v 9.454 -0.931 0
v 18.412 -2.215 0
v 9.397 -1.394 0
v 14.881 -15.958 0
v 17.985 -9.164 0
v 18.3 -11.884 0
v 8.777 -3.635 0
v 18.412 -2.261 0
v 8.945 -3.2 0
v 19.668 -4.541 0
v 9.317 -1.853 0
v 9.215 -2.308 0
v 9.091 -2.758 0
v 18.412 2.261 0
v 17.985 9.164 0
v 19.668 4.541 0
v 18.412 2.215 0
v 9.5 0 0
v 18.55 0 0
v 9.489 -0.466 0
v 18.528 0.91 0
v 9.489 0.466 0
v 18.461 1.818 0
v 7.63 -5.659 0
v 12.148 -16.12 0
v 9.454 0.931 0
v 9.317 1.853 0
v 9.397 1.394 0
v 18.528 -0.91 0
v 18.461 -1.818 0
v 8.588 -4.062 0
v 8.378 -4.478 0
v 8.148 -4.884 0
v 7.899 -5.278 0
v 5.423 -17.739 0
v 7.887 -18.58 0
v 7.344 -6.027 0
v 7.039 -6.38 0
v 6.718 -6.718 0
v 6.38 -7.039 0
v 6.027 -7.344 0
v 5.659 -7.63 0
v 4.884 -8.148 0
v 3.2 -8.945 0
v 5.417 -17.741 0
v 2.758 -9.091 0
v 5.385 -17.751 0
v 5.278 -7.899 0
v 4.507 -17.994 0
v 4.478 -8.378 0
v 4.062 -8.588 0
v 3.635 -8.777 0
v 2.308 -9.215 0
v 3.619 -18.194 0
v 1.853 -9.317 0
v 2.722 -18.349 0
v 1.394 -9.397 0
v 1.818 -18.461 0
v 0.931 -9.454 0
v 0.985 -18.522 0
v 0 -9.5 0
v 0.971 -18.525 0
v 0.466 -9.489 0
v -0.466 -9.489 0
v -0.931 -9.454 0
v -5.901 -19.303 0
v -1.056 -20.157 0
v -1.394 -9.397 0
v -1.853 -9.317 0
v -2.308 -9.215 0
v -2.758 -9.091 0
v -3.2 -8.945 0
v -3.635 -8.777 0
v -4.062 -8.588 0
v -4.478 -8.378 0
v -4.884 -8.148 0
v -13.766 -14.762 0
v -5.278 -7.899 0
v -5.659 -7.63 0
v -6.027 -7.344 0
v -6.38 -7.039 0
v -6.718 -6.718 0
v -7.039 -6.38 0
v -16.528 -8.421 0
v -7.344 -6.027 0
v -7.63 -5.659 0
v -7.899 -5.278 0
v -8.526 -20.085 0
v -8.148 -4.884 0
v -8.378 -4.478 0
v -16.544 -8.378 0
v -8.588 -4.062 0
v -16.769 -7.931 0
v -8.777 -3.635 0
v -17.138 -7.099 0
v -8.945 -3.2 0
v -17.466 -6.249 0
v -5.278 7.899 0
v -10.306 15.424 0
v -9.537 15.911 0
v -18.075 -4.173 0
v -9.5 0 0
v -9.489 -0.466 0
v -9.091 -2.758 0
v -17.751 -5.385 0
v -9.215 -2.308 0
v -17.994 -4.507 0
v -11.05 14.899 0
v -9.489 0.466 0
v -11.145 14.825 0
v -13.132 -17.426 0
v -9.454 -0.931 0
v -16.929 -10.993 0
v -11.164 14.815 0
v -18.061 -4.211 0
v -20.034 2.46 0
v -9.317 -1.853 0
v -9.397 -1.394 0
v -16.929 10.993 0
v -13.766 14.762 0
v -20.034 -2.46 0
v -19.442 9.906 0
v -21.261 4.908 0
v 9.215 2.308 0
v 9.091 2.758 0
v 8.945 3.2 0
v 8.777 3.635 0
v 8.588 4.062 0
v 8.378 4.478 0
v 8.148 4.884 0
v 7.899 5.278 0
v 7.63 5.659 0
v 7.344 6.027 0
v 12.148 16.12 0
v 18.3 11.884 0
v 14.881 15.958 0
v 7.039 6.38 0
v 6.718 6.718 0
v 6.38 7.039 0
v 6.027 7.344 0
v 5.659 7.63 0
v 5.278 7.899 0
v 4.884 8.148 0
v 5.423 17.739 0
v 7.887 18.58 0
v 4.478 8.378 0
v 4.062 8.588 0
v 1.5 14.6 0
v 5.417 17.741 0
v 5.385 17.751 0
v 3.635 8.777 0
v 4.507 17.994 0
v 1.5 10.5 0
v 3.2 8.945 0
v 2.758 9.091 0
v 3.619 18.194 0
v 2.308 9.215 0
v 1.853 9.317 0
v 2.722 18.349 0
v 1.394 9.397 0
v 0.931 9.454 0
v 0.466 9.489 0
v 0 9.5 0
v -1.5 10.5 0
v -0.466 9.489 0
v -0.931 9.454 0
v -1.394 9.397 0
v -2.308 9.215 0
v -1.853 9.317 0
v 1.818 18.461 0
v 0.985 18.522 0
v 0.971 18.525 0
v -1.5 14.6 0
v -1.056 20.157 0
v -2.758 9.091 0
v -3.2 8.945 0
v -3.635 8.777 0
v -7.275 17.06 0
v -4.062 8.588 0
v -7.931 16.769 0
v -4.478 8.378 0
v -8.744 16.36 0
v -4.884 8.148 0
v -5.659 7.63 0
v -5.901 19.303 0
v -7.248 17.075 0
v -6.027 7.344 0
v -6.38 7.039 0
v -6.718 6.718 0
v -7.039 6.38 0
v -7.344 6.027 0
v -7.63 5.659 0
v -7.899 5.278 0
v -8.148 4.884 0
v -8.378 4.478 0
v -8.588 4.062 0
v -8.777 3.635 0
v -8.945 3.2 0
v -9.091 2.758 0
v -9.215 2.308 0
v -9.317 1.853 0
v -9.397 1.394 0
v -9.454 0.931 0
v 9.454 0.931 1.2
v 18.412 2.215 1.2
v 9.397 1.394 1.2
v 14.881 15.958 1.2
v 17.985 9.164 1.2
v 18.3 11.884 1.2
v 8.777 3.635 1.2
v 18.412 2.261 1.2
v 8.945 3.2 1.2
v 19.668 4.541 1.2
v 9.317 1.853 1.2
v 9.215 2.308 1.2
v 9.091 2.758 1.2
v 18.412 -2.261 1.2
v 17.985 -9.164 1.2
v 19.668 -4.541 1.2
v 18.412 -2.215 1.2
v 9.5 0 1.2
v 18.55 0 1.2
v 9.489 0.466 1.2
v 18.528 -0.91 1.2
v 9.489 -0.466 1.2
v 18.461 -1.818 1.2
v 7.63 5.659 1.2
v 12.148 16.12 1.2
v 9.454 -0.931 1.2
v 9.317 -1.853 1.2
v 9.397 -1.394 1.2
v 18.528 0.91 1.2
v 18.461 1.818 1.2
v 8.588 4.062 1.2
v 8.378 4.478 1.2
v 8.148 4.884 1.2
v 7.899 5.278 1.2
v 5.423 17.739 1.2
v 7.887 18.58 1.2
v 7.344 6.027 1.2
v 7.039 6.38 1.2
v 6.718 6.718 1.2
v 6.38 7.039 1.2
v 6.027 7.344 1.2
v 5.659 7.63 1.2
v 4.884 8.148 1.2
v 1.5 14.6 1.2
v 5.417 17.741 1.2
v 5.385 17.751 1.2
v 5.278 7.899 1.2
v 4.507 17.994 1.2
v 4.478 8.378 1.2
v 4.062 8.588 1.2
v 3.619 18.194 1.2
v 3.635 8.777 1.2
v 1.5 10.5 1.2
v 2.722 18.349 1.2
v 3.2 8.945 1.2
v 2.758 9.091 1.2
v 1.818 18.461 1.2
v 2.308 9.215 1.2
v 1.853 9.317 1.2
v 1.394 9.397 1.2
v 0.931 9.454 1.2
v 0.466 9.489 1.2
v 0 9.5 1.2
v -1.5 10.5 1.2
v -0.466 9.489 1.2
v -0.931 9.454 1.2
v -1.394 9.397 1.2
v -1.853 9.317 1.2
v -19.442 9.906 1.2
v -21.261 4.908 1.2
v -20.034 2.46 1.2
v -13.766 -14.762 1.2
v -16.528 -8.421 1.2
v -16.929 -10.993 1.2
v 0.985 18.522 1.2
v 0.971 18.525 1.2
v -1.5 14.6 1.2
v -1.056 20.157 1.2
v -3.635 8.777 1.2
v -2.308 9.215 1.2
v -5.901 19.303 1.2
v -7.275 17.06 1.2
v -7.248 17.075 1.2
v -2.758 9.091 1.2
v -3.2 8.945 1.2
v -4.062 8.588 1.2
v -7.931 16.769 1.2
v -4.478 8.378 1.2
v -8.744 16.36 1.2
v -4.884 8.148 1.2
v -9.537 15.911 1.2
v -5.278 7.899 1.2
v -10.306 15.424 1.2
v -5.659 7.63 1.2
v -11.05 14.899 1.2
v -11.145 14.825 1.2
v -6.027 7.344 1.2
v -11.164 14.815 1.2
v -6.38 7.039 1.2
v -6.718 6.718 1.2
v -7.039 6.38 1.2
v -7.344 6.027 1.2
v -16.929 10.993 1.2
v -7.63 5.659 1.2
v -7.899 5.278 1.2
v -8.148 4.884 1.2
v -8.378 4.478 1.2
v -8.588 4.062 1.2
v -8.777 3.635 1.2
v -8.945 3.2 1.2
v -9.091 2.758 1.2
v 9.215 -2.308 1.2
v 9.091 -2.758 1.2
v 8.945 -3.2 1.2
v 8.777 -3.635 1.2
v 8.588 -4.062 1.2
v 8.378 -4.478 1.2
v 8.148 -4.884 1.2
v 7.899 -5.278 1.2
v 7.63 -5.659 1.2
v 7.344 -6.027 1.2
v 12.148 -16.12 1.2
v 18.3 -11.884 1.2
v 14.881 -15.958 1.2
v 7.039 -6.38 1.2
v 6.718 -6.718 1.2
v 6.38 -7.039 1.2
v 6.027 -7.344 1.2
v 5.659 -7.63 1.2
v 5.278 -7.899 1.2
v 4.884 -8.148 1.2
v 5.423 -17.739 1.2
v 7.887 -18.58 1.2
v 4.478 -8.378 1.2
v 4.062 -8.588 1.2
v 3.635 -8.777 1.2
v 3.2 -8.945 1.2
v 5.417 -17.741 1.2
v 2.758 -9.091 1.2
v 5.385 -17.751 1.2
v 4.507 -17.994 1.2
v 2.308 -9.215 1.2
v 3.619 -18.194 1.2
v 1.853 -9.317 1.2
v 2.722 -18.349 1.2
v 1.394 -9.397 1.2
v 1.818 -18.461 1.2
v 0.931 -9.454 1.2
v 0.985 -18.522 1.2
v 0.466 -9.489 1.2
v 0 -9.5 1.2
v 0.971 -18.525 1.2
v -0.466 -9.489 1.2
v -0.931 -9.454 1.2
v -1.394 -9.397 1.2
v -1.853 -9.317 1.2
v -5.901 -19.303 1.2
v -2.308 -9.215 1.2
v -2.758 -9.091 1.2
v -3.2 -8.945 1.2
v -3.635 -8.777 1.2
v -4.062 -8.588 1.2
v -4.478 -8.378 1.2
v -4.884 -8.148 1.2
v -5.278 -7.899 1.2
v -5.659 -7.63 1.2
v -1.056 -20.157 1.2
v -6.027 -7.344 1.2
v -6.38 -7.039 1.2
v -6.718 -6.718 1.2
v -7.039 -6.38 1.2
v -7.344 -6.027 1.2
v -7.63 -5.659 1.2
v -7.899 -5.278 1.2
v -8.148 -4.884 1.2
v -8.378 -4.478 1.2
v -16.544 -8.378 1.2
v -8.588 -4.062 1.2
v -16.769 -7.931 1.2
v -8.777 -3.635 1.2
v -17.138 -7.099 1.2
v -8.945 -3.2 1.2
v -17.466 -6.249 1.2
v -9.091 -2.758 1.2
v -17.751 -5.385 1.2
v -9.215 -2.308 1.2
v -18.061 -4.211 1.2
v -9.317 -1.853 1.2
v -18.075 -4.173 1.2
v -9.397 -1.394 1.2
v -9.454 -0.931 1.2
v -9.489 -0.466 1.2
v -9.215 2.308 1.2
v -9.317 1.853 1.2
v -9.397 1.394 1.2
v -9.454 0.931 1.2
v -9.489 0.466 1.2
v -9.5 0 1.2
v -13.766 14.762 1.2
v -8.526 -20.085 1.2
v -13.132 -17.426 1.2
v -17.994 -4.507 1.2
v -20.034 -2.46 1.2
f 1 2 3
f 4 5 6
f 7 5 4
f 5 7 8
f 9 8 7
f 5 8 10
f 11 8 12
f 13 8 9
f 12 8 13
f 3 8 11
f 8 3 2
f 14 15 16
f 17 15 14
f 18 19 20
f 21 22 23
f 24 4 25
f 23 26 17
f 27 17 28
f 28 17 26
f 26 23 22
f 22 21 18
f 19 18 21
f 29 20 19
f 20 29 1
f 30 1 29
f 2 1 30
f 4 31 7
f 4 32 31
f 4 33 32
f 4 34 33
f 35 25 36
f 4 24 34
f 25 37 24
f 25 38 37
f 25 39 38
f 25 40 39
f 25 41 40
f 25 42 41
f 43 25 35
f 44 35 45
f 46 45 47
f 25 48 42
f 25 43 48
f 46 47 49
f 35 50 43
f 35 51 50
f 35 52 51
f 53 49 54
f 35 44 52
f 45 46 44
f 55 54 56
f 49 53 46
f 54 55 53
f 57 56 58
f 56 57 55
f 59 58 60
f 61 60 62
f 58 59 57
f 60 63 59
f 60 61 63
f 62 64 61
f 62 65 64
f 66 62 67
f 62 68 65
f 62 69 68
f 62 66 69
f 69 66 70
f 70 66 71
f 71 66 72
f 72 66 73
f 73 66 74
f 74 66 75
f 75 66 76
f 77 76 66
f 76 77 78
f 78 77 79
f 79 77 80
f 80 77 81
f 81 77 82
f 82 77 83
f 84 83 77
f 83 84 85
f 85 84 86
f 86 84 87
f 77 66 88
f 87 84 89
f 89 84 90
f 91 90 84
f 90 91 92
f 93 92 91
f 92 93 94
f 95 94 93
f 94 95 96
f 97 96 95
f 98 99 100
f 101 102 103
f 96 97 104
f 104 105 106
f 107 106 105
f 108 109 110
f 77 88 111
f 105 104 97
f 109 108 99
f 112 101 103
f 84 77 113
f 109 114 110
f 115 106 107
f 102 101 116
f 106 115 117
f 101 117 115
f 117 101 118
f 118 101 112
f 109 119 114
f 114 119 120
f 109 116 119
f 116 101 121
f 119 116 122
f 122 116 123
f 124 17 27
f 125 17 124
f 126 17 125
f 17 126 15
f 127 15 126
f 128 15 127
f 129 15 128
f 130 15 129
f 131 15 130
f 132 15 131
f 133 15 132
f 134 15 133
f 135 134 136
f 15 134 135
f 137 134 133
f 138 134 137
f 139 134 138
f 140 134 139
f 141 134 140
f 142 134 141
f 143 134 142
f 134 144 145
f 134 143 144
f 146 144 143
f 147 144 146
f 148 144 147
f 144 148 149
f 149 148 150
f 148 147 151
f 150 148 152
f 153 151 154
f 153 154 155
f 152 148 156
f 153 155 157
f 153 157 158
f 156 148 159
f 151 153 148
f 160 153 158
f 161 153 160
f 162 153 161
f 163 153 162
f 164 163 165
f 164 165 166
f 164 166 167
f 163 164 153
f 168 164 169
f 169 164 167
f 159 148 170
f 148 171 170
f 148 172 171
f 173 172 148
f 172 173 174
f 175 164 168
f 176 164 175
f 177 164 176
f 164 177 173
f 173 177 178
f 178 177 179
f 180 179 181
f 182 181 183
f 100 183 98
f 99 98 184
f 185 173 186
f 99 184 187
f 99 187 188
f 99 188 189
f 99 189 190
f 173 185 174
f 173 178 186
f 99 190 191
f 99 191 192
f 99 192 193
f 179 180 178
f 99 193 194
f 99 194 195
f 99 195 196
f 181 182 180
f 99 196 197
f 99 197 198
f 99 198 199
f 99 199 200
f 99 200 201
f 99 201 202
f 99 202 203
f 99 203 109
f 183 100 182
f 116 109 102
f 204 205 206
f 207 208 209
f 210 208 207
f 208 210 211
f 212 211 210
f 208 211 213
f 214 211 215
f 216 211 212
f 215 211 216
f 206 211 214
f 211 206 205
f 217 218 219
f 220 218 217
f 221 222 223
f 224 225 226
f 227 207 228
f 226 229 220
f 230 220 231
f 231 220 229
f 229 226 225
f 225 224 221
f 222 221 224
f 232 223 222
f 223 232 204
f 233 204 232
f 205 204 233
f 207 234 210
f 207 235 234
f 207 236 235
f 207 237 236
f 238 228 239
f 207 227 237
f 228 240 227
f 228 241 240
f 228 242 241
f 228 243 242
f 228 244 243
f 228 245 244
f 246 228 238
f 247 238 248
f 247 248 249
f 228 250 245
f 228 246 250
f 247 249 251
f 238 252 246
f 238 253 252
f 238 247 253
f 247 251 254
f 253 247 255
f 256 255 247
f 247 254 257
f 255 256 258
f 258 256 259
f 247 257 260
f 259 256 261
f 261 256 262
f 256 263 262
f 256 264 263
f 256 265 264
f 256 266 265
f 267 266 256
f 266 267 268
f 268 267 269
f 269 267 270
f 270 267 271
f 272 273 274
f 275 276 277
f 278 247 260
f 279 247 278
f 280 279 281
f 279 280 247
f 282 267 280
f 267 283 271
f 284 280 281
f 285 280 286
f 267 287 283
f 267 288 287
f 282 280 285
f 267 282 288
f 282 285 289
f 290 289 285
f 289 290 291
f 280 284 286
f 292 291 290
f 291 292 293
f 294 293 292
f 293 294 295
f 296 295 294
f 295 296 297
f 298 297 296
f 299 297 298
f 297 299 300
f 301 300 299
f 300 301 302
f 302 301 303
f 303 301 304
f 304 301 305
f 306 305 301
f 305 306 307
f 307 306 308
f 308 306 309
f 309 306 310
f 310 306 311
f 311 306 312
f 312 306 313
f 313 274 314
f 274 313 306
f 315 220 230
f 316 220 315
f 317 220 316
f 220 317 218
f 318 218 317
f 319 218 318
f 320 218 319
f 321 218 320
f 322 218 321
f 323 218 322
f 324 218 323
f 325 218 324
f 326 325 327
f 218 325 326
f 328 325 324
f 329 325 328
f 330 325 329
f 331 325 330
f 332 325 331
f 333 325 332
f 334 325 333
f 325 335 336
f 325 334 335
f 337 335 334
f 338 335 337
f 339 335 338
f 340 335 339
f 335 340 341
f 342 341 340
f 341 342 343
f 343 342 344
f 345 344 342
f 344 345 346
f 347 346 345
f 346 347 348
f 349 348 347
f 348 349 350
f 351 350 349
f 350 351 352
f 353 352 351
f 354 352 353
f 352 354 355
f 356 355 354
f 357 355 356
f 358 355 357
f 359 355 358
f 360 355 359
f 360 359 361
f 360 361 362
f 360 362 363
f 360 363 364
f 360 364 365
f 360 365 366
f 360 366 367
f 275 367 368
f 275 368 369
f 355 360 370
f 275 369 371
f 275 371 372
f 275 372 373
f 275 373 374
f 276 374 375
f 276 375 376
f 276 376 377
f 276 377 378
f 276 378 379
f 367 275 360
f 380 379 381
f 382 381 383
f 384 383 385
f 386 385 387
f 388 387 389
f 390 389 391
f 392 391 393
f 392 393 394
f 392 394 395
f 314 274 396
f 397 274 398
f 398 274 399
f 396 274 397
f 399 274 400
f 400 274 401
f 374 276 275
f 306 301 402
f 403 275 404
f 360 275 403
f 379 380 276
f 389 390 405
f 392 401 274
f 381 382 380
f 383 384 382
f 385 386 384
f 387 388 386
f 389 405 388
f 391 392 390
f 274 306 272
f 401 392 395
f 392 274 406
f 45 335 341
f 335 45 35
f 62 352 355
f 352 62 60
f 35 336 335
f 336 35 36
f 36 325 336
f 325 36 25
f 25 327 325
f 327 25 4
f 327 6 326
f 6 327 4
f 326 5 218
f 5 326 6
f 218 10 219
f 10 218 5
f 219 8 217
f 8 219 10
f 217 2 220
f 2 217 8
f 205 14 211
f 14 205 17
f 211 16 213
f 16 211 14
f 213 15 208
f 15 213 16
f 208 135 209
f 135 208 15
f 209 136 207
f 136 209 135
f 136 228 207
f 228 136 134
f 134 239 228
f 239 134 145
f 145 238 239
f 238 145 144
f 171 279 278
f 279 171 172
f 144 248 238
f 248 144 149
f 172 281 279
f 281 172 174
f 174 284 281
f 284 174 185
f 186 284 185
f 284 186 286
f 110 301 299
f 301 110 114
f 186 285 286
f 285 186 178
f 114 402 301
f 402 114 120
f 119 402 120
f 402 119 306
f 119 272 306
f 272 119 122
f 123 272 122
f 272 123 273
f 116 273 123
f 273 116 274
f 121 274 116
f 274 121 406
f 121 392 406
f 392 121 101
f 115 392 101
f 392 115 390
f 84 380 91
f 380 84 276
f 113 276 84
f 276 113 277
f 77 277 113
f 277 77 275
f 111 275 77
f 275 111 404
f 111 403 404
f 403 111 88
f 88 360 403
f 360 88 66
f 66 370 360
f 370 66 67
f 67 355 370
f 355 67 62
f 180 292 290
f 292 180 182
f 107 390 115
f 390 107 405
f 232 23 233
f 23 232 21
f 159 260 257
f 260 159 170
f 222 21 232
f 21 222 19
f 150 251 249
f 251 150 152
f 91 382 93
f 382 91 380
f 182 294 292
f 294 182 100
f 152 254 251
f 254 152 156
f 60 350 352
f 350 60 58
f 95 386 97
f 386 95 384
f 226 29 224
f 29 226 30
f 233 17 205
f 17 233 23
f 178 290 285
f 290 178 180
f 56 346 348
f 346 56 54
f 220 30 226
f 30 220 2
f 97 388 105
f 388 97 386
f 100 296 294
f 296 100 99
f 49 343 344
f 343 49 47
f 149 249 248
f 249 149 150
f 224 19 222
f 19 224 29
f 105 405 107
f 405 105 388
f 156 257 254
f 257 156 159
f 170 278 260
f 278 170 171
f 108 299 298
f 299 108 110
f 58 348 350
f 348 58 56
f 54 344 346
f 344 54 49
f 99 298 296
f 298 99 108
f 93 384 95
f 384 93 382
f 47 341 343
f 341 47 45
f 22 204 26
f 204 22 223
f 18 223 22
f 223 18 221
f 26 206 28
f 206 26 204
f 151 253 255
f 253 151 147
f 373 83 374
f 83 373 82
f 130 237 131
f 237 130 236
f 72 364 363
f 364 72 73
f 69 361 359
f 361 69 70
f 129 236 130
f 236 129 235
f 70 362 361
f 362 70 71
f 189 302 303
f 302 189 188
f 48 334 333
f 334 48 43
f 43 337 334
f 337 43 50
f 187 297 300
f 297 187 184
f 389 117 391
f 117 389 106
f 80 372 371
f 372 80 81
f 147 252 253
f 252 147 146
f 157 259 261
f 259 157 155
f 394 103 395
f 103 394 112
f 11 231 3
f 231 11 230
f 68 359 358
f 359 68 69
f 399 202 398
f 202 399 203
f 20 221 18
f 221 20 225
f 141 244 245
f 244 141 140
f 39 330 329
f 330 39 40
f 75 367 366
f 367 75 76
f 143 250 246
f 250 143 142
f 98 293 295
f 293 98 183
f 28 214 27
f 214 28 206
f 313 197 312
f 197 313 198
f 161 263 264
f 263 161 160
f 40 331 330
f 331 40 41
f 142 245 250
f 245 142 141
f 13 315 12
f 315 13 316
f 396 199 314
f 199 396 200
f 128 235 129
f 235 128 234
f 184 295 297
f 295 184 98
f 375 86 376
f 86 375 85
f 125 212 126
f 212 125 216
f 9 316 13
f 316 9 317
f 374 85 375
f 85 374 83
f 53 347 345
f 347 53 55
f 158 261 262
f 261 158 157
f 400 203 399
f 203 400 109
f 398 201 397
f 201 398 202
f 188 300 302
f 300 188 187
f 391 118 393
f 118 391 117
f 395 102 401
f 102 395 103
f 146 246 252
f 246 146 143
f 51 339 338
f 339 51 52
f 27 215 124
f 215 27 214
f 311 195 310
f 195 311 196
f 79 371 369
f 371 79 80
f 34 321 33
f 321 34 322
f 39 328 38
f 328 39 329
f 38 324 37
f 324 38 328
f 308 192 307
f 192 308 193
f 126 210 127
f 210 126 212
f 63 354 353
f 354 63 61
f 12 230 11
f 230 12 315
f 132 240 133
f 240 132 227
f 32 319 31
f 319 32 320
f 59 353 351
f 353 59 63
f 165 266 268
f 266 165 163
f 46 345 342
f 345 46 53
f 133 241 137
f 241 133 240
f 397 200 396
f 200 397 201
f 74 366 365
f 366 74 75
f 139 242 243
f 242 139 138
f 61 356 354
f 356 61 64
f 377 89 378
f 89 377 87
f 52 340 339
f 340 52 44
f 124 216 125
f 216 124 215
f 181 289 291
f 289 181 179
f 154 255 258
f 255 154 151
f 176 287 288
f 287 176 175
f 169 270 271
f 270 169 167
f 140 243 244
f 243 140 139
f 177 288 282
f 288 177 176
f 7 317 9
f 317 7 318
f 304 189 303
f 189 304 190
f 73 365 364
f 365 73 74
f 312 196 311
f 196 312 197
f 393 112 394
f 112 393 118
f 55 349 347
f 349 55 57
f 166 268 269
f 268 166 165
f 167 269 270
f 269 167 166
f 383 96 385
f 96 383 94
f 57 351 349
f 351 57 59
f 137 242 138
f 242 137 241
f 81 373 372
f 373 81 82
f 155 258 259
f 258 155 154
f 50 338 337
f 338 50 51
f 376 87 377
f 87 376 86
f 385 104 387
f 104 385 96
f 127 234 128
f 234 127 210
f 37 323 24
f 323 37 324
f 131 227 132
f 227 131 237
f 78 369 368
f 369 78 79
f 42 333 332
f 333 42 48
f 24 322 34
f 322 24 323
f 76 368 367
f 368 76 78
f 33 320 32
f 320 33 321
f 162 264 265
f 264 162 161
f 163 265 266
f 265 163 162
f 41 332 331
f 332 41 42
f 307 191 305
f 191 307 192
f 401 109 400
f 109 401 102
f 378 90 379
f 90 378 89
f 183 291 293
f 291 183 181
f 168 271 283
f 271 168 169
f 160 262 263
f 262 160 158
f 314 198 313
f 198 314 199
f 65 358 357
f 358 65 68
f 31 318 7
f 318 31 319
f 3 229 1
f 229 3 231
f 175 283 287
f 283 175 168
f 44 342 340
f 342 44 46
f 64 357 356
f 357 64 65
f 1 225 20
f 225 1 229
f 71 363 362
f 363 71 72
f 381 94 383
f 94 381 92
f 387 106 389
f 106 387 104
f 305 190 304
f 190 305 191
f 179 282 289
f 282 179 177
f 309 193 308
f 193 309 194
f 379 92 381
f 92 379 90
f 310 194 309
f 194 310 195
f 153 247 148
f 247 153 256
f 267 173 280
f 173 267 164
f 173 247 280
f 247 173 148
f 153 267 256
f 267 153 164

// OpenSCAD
/*
  Elna Supermatic cam 23
  Name: Sharp triangles
  Status: candidate

  Generated from measured parametric base v2.
  Surface mode: stepped
*/

include <_elna_measured_common.scad>;

profile_points = [
        [0.9708, 18.5246],
        [5.4235, 17.7395],
        [7.8869, 18.5804],
        [12.1476, 16.1205],
        [14.8812, 15.9581],
        [18.2998, 11.8840],
        [17.9850, 9.1638],
        [19.6677, 4.5406],
        [18.4117, 2.2607],
        [18.4117, -2.2607],
        [19.6677, -4.5406],
        [17.9850, -9.1638],
        [18.2998, -11.8840],
        [14.8812, -15.9581],
        [12.1476, -16.1205],
        [7.8869, -18.5804],
        [5.4235, -17.7395],
        [0.9708, -18.5246],
        [-1.0564, -20.1573],
        [-5.9015, -19.3030],
        [-8.5258, -20.0854],
        [-13.1316, -17.4262],
        [-13.7661, -14.7624],
        [-16.9286, -10.9935],
        [-16.5282, -8.4215],
        [-18.0746, -4.1728],
        [-20.0345, -2.4599],
        [-20.0345, 2.4599],
        [-21.2608, 4.9084],
        [-19.4418, 9.9061],
        [-16.9286, 10.9935],
        [-13.7661, 14.7624],
        [-11.1637, 14.8147],
        [-7.2481, 17.0754],
        [-5.9015, 19.3030],
        [-1.0564, 20.1573]
];

icon_points = [[-1.000,0.180], [-0.750,0.820], [-0.500,0.180], [-0.250,0.820], [0.000,0.180], [0.250,0.820], [0.500,0.180], [0.750,0.820], [1.000,0.180]];

elna_cam_ring(profile_points=profile_points);
